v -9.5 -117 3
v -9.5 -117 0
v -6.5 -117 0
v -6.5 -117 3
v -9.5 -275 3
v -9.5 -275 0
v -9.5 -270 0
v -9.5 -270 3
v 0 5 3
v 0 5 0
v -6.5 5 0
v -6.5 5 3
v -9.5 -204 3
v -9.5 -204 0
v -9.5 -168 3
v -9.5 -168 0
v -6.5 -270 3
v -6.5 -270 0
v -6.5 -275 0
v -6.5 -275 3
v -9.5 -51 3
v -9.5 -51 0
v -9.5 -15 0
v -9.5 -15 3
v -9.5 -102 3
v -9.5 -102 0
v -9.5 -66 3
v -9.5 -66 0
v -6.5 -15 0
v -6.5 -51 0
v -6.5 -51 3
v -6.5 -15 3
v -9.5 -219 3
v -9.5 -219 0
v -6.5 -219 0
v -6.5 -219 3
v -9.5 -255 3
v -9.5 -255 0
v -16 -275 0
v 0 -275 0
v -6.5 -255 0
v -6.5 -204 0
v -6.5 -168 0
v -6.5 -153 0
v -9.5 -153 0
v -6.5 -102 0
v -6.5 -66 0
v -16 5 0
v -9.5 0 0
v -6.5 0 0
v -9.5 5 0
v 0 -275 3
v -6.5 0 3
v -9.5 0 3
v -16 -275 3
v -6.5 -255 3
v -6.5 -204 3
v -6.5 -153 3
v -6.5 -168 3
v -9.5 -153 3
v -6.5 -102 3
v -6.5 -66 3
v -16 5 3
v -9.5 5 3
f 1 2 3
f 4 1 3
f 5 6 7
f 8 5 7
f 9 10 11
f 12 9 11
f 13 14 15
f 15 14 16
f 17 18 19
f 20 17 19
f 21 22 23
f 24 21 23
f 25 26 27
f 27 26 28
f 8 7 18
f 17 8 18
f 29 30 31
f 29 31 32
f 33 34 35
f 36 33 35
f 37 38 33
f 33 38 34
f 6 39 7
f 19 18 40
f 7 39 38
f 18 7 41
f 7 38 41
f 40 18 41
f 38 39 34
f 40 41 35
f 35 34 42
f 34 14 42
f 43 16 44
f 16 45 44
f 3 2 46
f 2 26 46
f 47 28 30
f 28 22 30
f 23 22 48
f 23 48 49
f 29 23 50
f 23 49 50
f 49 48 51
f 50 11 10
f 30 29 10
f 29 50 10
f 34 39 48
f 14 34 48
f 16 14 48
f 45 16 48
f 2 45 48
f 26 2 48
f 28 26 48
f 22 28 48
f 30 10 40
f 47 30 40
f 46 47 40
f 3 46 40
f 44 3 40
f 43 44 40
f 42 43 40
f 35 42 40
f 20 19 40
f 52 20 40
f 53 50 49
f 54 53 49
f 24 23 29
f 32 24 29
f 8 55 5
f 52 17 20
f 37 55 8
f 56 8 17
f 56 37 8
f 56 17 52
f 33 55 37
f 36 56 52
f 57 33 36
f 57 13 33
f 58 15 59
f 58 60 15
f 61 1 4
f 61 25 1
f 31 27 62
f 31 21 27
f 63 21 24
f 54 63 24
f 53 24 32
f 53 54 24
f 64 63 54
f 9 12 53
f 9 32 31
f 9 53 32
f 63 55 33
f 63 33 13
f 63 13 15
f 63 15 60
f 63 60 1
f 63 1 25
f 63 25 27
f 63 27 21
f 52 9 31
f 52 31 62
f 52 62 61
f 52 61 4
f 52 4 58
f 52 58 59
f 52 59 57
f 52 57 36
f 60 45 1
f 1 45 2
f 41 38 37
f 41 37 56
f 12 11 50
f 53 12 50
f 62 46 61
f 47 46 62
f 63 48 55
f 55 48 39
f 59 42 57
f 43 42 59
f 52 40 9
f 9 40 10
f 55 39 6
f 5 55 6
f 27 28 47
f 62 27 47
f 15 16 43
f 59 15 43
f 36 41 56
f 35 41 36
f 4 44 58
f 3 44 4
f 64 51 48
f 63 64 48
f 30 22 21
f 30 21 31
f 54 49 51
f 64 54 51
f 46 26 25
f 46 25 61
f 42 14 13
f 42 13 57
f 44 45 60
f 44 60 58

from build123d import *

# Parameters (mm, degrees)
F0_W     = 3
F0_H     = 36
F1_DEPTH = 3


with BuildPart() as f1:
    # F0 (on Top) → F1 (new body)
    with BuildSketch(Plane.XY):
        Polygon((-6.5, 5), (-6.5, 0), (-9.5, 0), (-9.5, 5), (-16, 5), (-16, 0), (-16, -270), (-16, -275), (-9.5, -275), (-9.5, -270), (-6.5, -270), (-6.5, -275), (0, -275), (0, -270), (0, 0), (0, 5), align=None)
        with Locations((-8, -237)):
            Rectangle(F0_W, F0_H, mode=Mode.SUBTRACT)
        with Locations((-8, -186)):
            Rectangle(F0_W, F0_H, mode=Mode.SUBTRACT)
        with Locations((-8, -135)):
            Rectangle(F0_W, F0_H, mode=Mode.SUBTRACT)
        with Locations((-8, -84)):
            Rectangle(F0_W, F0_H, mode=Mode.SUBTRACT)
        with Locations((-8, -33)):
            Rectangle(F0_W, F0_H, mode=Mode.SUBTRACT)
    extrude(amount=F1_DEPTH)


solid = f1.part
